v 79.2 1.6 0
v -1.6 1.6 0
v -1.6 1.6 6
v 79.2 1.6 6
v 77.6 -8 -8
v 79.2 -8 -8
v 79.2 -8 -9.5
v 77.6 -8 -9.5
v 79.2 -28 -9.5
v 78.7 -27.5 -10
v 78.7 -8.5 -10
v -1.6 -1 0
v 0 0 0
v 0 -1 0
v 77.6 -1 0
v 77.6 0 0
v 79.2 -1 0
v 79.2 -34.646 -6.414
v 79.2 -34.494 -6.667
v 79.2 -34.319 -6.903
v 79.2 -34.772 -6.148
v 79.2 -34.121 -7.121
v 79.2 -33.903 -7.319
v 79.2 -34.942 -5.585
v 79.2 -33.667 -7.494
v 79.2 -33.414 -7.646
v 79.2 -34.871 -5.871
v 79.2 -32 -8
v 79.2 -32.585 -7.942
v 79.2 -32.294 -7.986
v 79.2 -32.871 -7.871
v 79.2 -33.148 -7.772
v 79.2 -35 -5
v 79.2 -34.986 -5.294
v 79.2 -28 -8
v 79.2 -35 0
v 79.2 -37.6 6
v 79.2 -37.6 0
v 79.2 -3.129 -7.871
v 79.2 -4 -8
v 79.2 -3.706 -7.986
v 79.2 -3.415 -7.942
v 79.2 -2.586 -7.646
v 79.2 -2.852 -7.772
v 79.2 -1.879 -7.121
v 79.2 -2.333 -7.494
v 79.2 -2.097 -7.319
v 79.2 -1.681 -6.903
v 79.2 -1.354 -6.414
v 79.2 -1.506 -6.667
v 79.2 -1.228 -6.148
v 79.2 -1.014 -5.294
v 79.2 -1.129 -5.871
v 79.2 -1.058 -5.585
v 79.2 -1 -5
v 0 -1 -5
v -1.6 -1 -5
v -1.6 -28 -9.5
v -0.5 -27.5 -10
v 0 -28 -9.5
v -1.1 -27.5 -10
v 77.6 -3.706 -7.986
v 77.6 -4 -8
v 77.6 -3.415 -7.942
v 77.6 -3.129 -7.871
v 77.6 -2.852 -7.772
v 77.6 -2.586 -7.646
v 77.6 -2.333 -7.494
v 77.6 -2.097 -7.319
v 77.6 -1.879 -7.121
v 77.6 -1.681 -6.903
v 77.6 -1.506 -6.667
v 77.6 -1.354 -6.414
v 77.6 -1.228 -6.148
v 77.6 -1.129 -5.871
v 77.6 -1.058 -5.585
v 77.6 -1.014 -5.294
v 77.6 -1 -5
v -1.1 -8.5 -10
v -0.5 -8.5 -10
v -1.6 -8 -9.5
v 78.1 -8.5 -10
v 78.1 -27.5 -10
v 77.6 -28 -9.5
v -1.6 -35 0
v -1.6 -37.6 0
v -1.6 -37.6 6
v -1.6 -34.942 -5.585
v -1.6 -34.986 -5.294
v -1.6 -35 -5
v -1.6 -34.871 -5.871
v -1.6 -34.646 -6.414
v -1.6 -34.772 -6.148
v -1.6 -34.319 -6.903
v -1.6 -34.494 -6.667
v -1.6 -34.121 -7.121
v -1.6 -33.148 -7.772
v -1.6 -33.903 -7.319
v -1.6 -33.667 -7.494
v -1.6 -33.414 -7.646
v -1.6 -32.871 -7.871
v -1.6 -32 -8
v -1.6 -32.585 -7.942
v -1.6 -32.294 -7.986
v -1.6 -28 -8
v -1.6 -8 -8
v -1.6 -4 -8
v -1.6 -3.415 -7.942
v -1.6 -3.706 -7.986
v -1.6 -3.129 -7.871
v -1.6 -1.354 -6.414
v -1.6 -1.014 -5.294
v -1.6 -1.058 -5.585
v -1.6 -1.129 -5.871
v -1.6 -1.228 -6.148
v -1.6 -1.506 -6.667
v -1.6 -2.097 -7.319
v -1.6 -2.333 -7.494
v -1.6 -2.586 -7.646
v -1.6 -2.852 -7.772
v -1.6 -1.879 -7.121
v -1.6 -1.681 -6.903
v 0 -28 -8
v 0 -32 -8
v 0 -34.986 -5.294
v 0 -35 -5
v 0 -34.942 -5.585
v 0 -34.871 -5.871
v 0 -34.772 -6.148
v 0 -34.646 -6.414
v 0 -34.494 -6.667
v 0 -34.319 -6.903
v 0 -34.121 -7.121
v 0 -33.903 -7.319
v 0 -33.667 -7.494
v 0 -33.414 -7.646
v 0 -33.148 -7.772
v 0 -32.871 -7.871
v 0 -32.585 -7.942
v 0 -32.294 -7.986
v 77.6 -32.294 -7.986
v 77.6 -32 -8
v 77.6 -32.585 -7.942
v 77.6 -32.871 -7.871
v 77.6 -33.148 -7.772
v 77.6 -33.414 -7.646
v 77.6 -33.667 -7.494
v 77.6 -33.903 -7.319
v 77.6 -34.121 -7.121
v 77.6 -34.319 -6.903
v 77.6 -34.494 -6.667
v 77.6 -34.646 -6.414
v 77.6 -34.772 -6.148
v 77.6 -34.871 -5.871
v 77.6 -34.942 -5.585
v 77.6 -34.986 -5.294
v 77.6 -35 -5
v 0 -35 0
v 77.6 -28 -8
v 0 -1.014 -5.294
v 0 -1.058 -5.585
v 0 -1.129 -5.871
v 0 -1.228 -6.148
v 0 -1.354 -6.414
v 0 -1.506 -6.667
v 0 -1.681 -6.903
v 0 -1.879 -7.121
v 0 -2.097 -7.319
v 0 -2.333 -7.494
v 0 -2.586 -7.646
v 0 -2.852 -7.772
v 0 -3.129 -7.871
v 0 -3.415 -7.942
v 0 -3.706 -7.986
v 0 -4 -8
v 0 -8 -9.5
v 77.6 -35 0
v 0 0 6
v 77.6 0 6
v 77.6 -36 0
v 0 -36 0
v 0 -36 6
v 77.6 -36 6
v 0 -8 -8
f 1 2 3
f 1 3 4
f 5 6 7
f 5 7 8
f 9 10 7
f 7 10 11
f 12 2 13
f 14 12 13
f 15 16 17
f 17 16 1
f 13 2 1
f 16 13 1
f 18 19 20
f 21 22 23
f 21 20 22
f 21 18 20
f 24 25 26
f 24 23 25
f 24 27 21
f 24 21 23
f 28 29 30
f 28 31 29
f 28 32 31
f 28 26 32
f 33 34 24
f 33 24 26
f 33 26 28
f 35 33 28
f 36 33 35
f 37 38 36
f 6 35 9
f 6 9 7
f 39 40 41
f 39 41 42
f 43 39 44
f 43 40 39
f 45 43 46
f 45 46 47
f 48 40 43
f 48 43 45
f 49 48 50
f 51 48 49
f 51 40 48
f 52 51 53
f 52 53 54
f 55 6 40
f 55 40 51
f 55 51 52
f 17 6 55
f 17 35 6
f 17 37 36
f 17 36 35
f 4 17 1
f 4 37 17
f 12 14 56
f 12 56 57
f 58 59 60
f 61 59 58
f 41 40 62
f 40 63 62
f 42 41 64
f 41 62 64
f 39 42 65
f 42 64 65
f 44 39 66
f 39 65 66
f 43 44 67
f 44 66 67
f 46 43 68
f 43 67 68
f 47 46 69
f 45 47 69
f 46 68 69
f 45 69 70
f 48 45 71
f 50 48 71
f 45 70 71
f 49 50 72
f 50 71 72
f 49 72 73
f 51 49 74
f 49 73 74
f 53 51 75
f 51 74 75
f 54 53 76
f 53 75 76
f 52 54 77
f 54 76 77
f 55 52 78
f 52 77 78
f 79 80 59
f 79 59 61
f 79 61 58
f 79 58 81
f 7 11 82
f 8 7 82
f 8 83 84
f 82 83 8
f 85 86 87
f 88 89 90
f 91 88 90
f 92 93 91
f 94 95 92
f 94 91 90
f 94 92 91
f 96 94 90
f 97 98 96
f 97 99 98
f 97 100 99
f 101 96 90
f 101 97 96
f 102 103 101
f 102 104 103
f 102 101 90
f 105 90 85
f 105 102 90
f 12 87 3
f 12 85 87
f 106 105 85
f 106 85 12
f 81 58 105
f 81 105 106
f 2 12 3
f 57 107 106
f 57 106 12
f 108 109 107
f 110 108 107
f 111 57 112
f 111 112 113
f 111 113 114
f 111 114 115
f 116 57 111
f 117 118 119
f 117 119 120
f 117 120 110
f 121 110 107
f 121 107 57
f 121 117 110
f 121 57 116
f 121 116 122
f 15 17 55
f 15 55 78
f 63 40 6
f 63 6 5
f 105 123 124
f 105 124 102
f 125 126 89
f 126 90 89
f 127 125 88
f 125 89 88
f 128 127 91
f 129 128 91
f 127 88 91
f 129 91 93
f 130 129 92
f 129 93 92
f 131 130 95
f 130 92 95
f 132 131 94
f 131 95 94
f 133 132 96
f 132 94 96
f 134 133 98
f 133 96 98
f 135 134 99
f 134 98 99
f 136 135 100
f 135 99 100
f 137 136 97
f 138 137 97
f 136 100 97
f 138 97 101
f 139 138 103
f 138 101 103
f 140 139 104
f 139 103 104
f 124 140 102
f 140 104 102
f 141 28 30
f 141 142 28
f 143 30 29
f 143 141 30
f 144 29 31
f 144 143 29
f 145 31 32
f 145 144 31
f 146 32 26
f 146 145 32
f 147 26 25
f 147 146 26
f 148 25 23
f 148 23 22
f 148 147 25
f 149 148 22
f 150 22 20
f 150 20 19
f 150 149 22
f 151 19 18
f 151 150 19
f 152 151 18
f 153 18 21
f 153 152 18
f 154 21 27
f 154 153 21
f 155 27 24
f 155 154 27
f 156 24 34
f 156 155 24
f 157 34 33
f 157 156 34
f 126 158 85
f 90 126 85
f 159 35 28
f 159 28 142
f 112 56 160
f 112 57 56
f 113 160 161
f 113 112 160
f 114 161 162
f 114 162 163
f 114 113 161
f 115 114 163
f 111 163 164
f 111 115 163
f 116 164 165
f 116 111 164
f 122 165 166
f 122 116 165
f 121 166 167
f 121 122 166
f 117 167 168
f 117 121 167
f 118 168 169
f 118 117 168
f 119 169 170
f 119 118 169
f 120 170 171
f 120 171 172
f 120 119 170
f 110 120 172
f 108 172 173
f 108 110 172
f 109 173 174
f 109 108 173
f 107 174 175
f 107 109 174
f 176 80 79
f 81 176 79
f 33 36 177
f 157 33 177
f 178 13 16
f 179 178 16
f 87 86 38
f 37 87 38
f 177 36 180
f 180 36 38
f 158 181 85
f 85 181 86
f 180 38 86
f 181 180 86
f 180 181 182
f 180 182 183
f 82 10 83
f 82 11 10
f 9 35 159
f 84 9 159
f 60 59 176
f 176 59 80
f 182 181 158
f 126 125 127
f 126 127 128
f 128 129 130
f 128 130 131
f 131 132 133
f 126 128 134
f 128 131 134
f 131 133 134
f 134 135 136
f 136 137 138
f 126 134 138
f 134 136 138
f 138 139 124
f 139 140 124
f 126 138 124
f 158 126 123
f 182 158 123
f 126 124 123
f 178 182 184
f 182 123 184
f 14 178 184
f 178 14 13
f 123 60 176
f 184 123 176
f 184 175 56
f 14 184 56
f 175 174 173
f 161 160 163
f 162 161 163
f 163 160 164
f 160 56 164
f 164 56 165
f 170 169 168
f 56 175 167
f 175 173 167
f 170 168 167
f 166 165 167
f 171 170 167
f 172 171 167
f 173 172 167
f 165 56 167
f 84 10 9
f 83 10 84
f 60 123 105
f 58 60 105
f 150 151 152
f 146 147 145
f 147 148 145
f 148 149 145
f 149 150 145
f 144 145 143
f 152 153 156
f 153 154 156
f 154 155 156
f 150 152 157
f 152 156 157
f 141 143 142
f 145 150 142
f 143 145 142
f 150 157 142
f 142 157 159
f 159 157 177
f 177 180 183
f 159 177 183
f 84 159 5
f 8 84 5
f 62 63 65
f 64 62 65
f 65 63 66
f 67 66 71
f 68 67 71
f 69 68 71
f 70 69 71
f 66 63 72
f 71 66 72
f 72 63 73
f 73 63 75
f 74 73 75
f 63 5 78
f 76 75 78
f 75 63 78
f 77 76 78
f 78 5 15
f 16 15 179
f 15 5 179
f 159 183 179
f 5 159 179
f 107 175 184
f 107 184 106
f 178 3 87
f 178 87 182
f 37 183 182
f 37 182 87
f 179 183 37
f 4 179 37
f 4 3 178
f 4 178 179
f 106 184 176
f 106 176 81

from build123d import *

# Parameters (mm, degrees)
SKETCH1_W           = 80.8
SKETCH1_H           = 39.2
SKETCH1_W_2         = 77.6
SKETCH1_H_2         = 36
BOSS_EXTRUDE1_DEPTH = 6
SKETCH2_W           = 1.6
SKETCH2_H           = 36
BOSS_EXTRUDE2_DEPTH = 8
MOVE_FACE1_BY       = 1
MOVE_FACE1_2_BY     = 1
MOVE_FACE1_3_BY     = 1
MOVE_FACE1_4_BY     = 1
SKETCH3_W           = 1.6
SKETCH3_H           = 20
BOSS_EXTRUDE3_DEPTH = 2
CHAMFER1_SIZE       = 0.5
FILLET1_R           = 3


with BuildPart() as part:
    # Sketch1 → Boss-Extrude1 (new body)
    with BuildSketch(Plane.XY):
        with Locations((38.8, -18)):
            Rectangle(SKETCH1_W, SKETCH1_H)
        with Locations((38.8, -18)):
            Rectangle(SKETCH1_W_2, SKETCH1_H_2, mode=Mode.SUBTRACT)
    extrude(amount=BOSS_EXTRUDE1_DEPTH)

    # Sketch2 → Boss-Extrude2 (add)
    with BuildSketch(Plane(origin=(0, 0, 0), x_dir=(-1, 0, 0), z_dir=(0, 0, -1))):
        with Locations((-78.4, -18)):
            Rectangle(SKETCH2_W, SKETCH2_H)
        with Locations((0.8, -18)):
            Rectangle(SKETCH2_W, SKETCH2_H)
    extrude(amount=BOSS_EXTRUDE2_DEPTH)

    # Move Face1: a face moved inward by 1.0
    extrude(part.faces().sort_by_distance((78.4, 0, -4))[0], amount=MOVE_FACE1_BY, dir=(0, -1, 0), mode=Mode.SUBTRACT)

    # Move Face1 2: a face moved inward by 1.0
    extrude(part.faces().sort_by_distance((78.4, -36, -4))[0], amount=MOVE_FACE1_2_BY, dir=(0, 1, 0), mode=Mode.SUBTRACT)

    # Move Face1 3: a face moved inward by 1.0
    extrude(part.faces().sort_by_distance((-0.8, -36, -4))[0], amount=MOVE_FACE1_3_BY, dir=(0, 1, 0), mode=Mode.SUBTRACT)

    # Move Face1 4: a face moved inward by 1.0
    extrude(part.faces().sort_by_distance((-0.8, 0, -4))[0], amount=MOVE_FACE1_4_BY, dir=(0, -1, 0), mode=Mode.SUBTRACT)

    # Sketch3 → Boss-Extrude3 (add)
    with BuildSketch(Plane(origin=(0, 0, -8), x_dir=(-1, 0, 0), z_dir=(0, 0, -1))):
        with Locations((-78.4, -18)):
            Rectangle(SKETCH3_W, SKETCH3_H)
        with Locations((0.8, -18)):
            Rectangle(SKETCH3_W, SKETCH3_H)
    extrude(amount=BOSS_EXTRUDE3_DEPTH)

    # Chamfer1
    chamfer1_edges = [part.edges().sort_by_distance(p)[0] for p in [
        (78.4, -28, -10),
        (77.6, -18, -10),
        (78.4, -8, -10),
        (79.2, -18, -10),
        (0, -18, -10),
        (-0.8, -28, -10),
        (-1.6, -18, -10),
        (-0.8, -8, -10),
    ]]
    chamfer(chamfer1_edges, length=CHAMFER1_SIZE)

    # Fillet1
    fillet1_edges = [part.edges().sort_by_distance(p)[0] for p in [
        (78.4, -1, -8),
        (78.4, -35, -8),
        (-0.8, -1, -8),
        (-0.8, -35, -8),
    ]]
    fillet(fillet1_edges, radius=FILLET1_R)


solid = part.part
